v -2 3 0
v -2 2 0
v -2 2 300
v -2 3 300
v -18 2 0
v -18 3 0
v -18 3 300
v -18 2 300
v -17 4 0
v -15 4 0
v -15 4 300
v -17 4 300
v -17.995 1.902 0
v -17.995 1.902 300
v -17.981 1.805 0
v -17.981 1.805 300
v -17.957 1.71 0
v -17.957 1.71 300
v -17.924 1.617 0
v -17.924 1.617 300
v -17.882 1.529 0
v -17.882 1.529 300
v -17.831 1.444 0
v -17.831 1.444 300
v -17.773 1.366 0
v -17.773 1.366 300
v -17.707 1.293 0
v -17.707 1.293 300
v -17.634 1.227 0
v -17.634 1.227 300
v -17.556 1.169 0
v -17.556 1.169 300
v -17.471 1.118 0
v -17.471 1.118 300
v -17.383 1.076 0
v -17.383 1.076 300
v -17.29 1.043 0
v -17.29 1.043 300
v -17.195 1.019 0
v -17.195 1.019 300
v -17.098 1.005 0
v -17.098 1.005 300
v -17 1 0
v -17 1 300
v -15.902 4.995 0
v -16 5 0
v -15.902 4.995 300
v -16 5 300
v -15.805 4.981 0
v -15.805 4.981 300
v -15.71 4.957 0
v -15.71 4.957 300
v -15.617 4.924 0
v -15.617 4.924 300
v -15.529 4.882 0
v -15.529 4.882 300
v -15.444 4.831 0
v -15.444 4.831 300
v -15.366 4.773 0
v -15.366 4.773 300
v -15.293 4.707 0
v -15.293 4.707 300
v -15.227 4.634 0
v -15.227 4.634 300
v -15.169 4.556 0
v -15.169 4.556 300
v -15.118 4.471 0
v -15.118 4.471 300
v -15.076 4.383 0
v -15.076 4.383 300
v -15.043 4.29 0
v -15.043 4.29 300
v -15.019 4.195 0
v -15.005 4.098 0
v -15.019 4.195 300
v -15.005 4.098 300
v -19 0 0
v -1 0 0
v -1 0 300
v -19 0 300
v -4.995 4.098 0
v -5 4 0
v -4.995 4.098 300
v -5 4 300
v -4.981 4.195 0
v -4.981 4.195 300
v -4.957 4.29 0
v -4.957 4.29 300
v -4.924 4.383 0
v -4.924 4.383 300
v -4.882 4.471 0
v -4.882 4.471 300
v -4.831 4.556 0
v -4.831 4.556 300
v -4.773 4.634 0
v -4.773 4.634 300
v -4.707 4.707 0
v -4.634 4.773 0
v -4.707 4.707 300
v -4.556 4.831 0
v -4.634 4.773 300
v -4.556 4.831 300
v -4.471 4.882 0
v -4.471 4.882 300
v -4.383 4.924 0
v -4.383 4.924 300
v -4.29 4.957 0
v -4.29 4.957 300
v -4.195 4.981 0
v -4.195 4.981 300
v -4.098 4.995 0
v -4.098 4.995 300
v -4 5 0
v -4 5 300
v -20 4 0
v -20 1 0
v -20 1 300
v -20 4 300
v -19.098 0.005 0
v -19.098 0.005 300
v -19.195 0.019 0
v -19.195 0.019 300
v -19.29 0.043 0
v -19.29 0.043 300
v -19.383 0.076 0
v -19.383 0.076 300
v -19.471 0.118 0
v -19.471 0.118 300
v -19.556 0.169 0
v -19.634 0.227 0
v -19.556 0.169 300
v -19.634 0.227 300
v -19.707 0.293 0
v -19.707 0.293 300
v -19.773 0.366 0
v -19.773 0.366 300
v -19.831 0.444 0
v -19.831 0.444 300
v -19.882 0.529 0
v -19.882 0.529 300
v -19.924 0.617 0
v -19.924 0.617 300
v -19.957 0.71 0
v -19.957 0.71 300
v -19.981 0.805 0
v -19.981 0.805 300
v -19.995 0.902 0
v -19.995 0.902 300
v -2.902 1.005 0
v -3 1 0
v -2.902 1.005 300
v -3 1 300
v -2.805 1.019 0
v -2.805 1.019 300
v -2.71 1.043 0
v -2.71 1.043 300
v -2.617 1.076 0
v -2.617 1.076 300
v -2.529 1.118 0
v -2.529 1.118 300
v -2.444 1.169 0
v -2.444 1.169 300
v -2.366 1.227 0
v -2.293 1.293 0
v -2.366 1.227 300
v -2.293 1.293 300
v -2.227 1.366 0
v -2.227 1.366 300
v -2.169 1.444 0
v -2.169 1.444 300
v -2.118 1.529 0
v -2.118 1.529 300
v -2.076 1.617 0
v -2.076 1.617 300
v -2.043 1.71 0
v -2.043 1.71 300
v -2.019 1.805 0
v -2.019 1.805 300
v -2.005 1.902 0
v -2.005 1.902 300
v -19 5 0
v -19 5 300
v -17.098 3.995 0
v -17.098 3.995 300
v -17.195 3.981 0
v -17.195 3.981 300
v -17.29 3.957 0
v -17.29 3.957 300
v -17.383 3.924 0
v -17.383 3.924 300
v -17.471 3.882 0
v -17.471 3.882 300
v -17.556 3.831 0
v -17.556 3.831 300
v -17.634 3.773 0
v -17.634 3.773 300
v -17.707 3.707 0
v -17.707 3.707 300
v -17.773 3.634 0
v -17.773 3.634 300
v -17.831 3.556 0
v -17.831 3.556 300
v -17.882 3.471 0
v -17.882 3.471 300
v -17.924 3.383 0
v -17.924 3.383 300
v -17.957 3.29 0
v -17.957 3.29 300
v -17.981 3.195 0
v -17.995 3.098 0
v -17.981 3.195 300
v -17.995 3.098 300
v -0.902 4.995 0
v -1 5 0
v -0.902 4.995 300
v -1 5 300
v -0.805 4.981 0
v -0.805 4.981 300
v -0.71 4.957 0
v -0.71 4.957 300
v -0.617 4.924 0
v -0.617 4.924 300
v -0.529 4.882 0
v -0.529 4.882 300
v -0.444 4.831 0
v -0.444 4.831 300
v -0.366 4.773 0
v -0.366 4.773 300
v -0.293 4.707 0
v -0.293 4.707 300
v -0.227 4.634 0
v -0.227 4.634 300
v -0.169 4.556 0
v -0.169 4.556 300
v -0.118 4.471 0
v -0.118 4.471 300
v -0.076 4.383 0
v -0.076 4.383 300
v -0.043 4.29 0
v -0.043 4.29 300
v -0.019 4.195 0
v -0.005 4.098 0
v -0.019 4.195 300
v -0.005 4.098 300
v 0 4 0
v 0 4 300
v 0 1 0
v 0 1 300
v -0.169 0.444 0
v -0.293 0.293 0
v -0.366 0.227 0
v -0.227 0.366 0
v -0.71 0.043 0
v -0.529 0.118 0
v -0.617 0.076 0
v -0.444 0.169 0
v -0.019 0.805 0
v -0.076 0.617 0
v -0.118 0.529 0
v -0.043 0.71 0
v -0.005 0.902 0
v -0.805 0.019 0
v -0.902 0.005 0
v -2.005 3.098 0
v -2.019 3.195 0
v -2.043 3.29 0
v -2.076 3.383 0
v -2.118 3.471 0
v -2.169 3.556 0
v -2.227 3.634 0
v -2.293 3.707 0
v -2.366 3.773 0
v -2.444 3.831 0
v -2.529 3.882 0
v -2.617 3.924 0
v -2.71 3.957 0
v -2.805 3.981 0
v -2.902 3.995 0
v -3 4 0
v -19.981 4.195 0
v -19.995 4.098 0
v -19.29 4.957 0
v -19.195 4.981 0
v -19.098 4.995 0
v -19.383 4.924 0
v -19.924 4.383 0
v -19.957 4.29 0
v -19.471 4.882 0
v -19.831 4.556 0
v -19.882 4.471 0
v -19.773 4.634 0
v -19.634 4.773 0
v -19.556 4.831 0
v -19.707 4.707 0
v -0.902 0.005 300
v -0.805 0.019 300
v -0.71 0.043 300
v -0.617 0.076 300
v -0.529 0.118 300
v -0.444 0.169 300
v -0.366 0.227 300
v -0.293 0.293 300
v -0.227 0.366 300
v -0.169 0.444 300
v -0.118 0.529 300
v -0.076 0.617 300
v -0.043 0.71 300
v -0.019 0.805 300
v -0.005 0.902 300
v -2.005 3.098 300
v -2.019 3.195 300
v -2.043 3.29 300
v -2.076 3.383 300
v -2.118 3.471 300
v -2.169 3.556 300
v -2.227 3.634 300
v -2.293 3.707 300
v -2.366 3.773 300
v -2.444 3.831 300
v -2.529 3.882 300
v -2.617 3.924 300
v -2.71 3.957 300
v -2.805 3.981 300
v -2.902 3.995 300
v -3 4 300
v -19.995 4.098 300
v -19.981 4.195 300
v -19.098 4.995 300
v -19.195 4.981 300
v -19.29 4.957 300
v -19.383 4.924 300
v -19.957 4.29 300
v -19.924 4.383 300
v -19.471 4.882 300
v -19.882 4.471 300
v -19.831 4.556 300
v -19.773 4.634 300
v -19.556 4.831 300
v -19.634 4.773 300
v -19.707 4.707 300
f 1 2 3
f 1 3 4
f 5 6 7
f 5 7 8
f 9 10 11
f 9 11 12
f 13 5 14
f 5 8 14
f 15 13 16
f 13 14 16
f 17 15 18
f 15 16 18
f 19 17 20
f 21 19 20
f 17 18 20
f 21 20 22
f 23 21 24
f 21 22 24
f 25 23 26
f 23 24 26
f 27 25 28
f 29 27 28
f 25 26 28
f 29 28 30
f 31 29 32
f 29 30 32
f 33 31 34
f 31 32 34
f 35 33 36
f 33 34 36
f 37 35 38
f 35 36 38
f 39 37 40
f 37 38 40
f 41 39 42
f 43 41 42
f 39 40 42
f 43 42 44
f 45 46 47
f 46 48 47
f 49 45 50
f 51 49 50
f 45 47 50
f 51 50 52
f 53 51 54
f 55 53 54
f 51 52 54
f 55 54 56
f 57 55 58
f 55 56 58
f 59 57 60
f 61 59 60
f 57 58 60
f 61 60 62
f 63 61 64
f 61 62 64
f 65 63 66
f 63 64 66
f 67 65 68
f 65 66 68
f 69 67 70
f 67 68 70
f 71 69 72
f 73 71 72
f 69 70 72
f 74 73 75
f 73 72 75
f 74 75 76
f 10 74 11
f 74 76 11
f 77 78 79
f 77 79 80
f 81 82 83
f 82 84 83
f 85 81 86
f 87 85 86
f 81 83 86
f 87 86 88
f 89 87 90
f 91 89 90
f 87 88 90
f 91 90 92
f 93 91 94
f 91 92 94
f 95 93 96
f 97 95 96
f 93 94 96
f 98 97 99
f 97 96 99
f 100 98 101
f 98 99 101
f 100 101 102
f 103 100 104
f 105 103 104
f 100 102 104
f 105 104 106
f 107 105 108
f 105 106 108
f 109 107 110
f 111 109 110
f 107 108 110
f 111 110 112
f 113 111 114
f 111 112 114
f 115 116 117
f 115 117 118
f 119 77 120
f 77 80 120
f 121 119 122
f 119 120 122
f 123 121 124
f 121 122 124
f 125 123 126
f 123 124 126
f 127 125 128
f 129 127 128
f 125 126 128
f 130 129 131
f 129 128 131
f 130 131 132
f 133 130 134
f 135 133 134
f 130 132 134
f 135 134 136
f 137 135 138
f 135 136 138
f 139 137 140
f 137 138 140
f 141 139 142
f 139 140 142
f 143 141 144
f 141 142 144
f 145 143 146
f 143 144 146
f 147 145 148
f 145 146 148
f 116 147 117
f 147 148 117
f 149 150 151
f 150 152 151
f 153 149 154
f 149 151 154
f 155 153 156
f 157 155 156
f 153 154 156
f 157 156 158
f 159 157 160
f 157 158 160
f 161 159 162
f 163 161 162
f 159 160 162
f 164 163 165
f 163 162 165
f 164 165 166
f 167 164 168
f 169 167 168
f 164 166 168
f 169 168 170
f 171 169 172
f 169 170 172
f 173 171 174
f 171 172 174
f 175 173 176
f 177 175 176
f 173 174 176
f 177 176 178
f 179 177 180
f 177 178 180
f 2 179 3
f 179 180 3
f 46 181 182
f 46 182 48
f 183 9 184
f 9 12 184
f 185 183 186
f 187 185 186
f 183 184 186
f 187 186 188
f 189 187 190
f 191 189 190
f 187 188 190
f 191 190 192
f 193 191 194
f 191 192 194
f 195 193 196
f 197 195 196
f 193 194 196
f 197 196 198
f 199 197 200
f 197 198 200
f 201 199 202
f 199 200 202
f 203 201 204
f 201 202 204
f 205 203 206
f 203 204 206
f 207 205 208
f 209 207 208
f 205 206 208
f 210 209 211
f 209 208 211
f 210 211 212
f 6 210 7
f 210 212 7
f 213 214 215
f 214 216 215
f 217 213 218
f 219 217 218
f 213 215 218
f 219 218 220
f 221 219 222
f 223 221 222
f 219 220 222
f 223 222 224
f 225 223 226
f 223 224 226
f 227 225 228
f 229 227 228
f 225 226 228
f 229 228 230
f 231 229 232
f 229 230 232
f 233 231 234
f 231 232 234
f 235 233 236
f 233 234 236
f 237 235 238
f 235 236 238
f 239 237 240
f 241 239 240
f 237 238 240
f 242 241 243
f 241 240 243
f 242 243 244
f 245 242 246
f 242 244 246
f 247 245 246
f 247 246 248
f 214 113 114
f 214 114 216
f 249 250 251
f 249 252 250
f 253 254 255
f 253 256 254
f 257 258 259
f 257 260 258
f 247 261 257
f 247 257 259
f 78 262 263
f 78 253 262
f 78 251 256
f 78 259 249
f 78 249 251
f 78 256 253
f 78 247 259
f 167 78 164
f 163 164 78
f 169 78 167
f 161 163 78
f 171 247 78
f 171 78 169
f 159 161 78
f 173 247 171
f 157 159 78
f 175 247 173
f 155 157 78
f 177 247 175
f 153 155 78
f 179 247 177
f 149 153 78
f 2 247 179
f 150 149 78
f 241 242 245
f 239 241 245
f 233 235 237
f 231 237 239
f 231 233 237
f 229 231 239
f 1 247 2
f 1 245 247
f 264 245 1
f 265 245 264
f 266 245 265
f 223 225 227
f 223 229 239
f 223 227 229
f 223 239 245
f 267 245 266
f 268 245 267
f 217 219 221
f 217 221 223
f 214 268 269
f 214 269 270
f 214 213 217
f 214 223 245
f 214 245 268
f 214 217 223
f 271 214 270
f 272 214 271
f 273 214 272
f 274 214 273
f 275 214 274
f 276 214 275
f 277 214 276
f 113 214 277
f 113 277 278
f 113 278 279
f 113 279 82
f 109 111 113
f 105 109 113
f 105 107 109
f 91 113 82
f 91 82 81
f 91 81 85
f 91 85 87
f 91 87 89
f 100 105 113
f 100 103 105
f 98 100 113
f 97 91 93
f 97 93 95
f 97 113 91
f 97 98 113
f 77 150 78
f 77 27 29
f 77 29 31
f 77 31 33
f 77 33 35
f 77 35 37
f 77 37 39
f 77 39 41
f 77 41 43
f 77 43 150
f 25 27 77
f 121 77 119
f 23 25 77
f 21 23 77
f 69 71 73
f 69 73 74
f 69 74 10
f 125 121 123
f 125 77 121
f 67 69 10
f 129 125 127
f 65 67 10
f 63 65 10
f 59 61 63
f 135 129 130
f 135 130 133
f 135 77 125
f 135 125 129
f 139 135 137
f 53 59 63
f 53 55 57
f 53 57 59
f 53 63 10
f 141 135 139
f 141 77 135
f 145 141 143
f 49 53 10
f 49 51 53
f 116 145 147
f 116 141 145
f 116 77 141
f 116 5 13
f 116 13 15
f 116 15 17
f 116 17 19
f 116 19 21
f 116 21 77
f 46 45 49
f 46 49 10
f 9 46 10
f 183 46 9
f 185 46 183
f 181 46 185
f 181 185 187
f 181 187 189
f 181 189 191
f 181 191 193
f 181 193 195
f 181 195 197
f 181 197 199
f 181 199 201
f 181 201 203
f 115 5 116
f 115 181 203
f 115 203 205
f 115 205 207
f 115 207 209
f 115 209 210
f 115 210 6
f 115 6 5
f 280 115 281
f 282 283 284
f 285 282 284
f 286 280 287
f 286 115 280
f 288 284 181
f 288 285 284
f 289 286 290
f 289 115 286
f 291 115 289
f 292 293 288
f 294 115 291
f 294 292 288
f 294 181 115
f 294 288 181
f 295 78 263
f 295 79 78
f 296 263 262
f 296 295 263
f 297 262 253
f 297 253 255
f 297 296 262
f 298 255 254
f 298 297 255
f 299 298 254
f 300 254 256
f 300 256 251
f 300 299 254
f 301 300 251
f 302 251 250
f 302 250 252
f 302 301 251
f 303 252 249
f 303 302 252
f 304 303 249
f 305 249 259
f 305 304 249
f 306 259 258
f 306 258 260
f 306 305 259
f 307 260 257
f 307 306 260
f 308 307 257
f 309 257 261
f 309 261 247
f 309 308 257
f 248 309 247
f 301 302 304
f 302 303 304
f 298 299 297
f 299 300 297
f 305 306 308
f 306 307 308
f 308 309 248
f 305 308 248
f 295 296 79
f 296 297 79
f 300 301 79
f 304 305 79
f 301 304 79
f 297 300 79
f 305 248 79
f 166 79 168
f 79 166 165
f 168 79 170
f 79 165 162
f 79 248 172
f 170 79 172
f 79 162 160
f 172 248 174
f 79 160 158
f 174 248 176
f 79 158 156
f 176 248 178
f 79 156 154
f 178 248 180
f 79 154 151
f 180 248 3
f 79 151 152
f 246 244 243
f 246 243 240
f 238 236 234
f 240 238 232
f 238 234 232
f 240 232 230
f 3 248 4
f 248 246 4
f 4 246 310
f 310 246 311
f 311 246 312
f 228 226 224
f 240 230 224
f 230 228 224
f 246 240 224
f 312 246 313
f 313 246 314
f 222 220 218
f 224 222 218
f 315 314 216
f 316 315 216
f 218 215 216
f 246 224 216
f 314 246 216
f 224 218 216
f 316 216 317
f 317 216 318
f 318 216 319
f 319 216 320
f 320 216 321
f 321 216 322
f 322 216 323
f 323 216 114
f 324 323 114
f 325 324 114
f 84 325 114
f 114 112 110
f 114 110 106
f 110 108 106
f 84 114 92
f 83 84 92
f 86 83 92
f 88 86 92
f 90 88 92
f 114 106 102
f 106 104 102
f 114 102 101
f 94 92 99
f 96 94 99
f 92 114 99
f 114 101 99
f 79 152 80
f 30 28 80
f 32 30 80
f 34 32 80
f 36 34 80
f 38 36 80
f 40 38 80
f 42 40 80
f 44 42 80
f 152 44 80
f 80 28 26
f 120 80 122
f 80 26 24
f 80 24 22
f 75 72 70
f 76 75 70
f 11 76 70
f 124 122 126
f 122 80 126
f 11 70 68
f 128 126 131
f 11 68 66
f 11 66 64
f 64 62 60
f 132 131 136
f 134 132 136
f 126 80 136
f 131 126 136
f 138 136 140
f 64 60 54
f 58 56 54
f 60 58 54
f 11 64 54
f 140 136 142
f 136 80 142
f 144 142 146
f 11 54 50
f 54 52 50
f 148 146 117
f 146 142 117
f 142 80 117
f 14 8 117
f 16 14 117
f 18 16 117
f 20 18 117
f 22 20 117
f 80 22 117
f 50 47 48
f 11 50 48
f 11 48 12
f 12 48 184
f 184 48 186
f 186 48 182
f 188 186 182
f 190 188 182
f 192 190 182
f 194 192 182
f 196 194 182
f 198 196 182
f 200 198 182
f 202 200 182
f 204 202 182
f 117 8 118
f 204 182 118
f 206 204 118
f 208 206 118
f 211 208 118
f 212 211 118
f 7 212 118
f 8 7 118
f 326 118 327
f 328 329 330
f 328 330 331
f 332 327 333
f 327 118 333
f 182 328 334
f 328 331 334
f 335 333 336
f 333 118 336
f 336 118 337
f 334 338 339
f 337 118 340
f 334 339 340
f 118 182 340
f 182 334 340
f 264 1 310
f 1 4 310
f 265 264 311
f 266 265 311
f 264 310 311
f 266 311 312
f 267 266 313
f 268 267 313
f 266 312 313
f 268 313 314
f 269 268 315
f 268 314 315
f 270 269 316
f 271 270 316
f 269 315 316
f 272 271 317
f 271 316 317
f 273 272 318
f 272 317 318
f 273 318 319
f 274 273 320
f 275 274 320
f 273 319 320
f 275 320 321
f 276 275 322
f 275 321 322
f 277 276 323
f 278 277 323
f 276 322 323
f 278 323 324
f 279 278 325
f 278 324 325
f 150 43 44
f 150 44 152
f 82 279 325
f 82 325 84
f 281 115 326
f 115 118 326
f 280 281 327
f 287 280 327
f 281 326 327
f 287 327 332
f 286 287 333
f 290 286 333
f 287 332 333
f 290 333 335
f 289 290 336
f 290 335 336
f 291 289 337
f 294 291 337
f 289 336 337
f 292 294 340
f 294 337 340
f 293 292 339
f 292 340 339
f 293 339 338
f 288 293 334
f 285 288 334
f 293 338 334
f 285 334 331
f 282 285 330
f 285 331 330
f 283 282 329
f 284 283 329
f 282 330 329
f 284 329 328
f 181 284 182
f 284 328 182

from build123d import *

# Parameters (mm, degrees)
BOSS_EXTRUDE1_DEPTH = 300
FILLET2_R           = 1


with BuildPart() as part:
    # Sketch1 → Boss-Extrude1 (new body)
    with BuildSketch(Plane.XY):
        Polygon((0, 0), (-20, 0), (-20, 5), (-15, 5), (-15, 4), (-18, 4), (-18, 1), (-2, 1), (-2, 4), (-5, 4), (-5, 5), (0, 5), align=None)
    extrude(amount=BOSS_EXTRUDE1_DEPTH)

    # Fillet2
    fillet2_edges = [part.edges().sort_by_distance(p)[0] for p in [
        (-18, 4, 150),
        (-2, 4, 150),
        (-2, 1, 150),
        (-18, 1, 150),
        (-20, 0, 150),
        (-20, 5, 150),
        (-15, 5, 150),
        (0, 0, 150),
        (0, 5, 150),
        (-5, 5, 150),
    ]]
    fillet(fillet2_edges, radius=FILLET2_R - 0.0001)  # a hair under: the kernel refuses the full size


solid = part.part
